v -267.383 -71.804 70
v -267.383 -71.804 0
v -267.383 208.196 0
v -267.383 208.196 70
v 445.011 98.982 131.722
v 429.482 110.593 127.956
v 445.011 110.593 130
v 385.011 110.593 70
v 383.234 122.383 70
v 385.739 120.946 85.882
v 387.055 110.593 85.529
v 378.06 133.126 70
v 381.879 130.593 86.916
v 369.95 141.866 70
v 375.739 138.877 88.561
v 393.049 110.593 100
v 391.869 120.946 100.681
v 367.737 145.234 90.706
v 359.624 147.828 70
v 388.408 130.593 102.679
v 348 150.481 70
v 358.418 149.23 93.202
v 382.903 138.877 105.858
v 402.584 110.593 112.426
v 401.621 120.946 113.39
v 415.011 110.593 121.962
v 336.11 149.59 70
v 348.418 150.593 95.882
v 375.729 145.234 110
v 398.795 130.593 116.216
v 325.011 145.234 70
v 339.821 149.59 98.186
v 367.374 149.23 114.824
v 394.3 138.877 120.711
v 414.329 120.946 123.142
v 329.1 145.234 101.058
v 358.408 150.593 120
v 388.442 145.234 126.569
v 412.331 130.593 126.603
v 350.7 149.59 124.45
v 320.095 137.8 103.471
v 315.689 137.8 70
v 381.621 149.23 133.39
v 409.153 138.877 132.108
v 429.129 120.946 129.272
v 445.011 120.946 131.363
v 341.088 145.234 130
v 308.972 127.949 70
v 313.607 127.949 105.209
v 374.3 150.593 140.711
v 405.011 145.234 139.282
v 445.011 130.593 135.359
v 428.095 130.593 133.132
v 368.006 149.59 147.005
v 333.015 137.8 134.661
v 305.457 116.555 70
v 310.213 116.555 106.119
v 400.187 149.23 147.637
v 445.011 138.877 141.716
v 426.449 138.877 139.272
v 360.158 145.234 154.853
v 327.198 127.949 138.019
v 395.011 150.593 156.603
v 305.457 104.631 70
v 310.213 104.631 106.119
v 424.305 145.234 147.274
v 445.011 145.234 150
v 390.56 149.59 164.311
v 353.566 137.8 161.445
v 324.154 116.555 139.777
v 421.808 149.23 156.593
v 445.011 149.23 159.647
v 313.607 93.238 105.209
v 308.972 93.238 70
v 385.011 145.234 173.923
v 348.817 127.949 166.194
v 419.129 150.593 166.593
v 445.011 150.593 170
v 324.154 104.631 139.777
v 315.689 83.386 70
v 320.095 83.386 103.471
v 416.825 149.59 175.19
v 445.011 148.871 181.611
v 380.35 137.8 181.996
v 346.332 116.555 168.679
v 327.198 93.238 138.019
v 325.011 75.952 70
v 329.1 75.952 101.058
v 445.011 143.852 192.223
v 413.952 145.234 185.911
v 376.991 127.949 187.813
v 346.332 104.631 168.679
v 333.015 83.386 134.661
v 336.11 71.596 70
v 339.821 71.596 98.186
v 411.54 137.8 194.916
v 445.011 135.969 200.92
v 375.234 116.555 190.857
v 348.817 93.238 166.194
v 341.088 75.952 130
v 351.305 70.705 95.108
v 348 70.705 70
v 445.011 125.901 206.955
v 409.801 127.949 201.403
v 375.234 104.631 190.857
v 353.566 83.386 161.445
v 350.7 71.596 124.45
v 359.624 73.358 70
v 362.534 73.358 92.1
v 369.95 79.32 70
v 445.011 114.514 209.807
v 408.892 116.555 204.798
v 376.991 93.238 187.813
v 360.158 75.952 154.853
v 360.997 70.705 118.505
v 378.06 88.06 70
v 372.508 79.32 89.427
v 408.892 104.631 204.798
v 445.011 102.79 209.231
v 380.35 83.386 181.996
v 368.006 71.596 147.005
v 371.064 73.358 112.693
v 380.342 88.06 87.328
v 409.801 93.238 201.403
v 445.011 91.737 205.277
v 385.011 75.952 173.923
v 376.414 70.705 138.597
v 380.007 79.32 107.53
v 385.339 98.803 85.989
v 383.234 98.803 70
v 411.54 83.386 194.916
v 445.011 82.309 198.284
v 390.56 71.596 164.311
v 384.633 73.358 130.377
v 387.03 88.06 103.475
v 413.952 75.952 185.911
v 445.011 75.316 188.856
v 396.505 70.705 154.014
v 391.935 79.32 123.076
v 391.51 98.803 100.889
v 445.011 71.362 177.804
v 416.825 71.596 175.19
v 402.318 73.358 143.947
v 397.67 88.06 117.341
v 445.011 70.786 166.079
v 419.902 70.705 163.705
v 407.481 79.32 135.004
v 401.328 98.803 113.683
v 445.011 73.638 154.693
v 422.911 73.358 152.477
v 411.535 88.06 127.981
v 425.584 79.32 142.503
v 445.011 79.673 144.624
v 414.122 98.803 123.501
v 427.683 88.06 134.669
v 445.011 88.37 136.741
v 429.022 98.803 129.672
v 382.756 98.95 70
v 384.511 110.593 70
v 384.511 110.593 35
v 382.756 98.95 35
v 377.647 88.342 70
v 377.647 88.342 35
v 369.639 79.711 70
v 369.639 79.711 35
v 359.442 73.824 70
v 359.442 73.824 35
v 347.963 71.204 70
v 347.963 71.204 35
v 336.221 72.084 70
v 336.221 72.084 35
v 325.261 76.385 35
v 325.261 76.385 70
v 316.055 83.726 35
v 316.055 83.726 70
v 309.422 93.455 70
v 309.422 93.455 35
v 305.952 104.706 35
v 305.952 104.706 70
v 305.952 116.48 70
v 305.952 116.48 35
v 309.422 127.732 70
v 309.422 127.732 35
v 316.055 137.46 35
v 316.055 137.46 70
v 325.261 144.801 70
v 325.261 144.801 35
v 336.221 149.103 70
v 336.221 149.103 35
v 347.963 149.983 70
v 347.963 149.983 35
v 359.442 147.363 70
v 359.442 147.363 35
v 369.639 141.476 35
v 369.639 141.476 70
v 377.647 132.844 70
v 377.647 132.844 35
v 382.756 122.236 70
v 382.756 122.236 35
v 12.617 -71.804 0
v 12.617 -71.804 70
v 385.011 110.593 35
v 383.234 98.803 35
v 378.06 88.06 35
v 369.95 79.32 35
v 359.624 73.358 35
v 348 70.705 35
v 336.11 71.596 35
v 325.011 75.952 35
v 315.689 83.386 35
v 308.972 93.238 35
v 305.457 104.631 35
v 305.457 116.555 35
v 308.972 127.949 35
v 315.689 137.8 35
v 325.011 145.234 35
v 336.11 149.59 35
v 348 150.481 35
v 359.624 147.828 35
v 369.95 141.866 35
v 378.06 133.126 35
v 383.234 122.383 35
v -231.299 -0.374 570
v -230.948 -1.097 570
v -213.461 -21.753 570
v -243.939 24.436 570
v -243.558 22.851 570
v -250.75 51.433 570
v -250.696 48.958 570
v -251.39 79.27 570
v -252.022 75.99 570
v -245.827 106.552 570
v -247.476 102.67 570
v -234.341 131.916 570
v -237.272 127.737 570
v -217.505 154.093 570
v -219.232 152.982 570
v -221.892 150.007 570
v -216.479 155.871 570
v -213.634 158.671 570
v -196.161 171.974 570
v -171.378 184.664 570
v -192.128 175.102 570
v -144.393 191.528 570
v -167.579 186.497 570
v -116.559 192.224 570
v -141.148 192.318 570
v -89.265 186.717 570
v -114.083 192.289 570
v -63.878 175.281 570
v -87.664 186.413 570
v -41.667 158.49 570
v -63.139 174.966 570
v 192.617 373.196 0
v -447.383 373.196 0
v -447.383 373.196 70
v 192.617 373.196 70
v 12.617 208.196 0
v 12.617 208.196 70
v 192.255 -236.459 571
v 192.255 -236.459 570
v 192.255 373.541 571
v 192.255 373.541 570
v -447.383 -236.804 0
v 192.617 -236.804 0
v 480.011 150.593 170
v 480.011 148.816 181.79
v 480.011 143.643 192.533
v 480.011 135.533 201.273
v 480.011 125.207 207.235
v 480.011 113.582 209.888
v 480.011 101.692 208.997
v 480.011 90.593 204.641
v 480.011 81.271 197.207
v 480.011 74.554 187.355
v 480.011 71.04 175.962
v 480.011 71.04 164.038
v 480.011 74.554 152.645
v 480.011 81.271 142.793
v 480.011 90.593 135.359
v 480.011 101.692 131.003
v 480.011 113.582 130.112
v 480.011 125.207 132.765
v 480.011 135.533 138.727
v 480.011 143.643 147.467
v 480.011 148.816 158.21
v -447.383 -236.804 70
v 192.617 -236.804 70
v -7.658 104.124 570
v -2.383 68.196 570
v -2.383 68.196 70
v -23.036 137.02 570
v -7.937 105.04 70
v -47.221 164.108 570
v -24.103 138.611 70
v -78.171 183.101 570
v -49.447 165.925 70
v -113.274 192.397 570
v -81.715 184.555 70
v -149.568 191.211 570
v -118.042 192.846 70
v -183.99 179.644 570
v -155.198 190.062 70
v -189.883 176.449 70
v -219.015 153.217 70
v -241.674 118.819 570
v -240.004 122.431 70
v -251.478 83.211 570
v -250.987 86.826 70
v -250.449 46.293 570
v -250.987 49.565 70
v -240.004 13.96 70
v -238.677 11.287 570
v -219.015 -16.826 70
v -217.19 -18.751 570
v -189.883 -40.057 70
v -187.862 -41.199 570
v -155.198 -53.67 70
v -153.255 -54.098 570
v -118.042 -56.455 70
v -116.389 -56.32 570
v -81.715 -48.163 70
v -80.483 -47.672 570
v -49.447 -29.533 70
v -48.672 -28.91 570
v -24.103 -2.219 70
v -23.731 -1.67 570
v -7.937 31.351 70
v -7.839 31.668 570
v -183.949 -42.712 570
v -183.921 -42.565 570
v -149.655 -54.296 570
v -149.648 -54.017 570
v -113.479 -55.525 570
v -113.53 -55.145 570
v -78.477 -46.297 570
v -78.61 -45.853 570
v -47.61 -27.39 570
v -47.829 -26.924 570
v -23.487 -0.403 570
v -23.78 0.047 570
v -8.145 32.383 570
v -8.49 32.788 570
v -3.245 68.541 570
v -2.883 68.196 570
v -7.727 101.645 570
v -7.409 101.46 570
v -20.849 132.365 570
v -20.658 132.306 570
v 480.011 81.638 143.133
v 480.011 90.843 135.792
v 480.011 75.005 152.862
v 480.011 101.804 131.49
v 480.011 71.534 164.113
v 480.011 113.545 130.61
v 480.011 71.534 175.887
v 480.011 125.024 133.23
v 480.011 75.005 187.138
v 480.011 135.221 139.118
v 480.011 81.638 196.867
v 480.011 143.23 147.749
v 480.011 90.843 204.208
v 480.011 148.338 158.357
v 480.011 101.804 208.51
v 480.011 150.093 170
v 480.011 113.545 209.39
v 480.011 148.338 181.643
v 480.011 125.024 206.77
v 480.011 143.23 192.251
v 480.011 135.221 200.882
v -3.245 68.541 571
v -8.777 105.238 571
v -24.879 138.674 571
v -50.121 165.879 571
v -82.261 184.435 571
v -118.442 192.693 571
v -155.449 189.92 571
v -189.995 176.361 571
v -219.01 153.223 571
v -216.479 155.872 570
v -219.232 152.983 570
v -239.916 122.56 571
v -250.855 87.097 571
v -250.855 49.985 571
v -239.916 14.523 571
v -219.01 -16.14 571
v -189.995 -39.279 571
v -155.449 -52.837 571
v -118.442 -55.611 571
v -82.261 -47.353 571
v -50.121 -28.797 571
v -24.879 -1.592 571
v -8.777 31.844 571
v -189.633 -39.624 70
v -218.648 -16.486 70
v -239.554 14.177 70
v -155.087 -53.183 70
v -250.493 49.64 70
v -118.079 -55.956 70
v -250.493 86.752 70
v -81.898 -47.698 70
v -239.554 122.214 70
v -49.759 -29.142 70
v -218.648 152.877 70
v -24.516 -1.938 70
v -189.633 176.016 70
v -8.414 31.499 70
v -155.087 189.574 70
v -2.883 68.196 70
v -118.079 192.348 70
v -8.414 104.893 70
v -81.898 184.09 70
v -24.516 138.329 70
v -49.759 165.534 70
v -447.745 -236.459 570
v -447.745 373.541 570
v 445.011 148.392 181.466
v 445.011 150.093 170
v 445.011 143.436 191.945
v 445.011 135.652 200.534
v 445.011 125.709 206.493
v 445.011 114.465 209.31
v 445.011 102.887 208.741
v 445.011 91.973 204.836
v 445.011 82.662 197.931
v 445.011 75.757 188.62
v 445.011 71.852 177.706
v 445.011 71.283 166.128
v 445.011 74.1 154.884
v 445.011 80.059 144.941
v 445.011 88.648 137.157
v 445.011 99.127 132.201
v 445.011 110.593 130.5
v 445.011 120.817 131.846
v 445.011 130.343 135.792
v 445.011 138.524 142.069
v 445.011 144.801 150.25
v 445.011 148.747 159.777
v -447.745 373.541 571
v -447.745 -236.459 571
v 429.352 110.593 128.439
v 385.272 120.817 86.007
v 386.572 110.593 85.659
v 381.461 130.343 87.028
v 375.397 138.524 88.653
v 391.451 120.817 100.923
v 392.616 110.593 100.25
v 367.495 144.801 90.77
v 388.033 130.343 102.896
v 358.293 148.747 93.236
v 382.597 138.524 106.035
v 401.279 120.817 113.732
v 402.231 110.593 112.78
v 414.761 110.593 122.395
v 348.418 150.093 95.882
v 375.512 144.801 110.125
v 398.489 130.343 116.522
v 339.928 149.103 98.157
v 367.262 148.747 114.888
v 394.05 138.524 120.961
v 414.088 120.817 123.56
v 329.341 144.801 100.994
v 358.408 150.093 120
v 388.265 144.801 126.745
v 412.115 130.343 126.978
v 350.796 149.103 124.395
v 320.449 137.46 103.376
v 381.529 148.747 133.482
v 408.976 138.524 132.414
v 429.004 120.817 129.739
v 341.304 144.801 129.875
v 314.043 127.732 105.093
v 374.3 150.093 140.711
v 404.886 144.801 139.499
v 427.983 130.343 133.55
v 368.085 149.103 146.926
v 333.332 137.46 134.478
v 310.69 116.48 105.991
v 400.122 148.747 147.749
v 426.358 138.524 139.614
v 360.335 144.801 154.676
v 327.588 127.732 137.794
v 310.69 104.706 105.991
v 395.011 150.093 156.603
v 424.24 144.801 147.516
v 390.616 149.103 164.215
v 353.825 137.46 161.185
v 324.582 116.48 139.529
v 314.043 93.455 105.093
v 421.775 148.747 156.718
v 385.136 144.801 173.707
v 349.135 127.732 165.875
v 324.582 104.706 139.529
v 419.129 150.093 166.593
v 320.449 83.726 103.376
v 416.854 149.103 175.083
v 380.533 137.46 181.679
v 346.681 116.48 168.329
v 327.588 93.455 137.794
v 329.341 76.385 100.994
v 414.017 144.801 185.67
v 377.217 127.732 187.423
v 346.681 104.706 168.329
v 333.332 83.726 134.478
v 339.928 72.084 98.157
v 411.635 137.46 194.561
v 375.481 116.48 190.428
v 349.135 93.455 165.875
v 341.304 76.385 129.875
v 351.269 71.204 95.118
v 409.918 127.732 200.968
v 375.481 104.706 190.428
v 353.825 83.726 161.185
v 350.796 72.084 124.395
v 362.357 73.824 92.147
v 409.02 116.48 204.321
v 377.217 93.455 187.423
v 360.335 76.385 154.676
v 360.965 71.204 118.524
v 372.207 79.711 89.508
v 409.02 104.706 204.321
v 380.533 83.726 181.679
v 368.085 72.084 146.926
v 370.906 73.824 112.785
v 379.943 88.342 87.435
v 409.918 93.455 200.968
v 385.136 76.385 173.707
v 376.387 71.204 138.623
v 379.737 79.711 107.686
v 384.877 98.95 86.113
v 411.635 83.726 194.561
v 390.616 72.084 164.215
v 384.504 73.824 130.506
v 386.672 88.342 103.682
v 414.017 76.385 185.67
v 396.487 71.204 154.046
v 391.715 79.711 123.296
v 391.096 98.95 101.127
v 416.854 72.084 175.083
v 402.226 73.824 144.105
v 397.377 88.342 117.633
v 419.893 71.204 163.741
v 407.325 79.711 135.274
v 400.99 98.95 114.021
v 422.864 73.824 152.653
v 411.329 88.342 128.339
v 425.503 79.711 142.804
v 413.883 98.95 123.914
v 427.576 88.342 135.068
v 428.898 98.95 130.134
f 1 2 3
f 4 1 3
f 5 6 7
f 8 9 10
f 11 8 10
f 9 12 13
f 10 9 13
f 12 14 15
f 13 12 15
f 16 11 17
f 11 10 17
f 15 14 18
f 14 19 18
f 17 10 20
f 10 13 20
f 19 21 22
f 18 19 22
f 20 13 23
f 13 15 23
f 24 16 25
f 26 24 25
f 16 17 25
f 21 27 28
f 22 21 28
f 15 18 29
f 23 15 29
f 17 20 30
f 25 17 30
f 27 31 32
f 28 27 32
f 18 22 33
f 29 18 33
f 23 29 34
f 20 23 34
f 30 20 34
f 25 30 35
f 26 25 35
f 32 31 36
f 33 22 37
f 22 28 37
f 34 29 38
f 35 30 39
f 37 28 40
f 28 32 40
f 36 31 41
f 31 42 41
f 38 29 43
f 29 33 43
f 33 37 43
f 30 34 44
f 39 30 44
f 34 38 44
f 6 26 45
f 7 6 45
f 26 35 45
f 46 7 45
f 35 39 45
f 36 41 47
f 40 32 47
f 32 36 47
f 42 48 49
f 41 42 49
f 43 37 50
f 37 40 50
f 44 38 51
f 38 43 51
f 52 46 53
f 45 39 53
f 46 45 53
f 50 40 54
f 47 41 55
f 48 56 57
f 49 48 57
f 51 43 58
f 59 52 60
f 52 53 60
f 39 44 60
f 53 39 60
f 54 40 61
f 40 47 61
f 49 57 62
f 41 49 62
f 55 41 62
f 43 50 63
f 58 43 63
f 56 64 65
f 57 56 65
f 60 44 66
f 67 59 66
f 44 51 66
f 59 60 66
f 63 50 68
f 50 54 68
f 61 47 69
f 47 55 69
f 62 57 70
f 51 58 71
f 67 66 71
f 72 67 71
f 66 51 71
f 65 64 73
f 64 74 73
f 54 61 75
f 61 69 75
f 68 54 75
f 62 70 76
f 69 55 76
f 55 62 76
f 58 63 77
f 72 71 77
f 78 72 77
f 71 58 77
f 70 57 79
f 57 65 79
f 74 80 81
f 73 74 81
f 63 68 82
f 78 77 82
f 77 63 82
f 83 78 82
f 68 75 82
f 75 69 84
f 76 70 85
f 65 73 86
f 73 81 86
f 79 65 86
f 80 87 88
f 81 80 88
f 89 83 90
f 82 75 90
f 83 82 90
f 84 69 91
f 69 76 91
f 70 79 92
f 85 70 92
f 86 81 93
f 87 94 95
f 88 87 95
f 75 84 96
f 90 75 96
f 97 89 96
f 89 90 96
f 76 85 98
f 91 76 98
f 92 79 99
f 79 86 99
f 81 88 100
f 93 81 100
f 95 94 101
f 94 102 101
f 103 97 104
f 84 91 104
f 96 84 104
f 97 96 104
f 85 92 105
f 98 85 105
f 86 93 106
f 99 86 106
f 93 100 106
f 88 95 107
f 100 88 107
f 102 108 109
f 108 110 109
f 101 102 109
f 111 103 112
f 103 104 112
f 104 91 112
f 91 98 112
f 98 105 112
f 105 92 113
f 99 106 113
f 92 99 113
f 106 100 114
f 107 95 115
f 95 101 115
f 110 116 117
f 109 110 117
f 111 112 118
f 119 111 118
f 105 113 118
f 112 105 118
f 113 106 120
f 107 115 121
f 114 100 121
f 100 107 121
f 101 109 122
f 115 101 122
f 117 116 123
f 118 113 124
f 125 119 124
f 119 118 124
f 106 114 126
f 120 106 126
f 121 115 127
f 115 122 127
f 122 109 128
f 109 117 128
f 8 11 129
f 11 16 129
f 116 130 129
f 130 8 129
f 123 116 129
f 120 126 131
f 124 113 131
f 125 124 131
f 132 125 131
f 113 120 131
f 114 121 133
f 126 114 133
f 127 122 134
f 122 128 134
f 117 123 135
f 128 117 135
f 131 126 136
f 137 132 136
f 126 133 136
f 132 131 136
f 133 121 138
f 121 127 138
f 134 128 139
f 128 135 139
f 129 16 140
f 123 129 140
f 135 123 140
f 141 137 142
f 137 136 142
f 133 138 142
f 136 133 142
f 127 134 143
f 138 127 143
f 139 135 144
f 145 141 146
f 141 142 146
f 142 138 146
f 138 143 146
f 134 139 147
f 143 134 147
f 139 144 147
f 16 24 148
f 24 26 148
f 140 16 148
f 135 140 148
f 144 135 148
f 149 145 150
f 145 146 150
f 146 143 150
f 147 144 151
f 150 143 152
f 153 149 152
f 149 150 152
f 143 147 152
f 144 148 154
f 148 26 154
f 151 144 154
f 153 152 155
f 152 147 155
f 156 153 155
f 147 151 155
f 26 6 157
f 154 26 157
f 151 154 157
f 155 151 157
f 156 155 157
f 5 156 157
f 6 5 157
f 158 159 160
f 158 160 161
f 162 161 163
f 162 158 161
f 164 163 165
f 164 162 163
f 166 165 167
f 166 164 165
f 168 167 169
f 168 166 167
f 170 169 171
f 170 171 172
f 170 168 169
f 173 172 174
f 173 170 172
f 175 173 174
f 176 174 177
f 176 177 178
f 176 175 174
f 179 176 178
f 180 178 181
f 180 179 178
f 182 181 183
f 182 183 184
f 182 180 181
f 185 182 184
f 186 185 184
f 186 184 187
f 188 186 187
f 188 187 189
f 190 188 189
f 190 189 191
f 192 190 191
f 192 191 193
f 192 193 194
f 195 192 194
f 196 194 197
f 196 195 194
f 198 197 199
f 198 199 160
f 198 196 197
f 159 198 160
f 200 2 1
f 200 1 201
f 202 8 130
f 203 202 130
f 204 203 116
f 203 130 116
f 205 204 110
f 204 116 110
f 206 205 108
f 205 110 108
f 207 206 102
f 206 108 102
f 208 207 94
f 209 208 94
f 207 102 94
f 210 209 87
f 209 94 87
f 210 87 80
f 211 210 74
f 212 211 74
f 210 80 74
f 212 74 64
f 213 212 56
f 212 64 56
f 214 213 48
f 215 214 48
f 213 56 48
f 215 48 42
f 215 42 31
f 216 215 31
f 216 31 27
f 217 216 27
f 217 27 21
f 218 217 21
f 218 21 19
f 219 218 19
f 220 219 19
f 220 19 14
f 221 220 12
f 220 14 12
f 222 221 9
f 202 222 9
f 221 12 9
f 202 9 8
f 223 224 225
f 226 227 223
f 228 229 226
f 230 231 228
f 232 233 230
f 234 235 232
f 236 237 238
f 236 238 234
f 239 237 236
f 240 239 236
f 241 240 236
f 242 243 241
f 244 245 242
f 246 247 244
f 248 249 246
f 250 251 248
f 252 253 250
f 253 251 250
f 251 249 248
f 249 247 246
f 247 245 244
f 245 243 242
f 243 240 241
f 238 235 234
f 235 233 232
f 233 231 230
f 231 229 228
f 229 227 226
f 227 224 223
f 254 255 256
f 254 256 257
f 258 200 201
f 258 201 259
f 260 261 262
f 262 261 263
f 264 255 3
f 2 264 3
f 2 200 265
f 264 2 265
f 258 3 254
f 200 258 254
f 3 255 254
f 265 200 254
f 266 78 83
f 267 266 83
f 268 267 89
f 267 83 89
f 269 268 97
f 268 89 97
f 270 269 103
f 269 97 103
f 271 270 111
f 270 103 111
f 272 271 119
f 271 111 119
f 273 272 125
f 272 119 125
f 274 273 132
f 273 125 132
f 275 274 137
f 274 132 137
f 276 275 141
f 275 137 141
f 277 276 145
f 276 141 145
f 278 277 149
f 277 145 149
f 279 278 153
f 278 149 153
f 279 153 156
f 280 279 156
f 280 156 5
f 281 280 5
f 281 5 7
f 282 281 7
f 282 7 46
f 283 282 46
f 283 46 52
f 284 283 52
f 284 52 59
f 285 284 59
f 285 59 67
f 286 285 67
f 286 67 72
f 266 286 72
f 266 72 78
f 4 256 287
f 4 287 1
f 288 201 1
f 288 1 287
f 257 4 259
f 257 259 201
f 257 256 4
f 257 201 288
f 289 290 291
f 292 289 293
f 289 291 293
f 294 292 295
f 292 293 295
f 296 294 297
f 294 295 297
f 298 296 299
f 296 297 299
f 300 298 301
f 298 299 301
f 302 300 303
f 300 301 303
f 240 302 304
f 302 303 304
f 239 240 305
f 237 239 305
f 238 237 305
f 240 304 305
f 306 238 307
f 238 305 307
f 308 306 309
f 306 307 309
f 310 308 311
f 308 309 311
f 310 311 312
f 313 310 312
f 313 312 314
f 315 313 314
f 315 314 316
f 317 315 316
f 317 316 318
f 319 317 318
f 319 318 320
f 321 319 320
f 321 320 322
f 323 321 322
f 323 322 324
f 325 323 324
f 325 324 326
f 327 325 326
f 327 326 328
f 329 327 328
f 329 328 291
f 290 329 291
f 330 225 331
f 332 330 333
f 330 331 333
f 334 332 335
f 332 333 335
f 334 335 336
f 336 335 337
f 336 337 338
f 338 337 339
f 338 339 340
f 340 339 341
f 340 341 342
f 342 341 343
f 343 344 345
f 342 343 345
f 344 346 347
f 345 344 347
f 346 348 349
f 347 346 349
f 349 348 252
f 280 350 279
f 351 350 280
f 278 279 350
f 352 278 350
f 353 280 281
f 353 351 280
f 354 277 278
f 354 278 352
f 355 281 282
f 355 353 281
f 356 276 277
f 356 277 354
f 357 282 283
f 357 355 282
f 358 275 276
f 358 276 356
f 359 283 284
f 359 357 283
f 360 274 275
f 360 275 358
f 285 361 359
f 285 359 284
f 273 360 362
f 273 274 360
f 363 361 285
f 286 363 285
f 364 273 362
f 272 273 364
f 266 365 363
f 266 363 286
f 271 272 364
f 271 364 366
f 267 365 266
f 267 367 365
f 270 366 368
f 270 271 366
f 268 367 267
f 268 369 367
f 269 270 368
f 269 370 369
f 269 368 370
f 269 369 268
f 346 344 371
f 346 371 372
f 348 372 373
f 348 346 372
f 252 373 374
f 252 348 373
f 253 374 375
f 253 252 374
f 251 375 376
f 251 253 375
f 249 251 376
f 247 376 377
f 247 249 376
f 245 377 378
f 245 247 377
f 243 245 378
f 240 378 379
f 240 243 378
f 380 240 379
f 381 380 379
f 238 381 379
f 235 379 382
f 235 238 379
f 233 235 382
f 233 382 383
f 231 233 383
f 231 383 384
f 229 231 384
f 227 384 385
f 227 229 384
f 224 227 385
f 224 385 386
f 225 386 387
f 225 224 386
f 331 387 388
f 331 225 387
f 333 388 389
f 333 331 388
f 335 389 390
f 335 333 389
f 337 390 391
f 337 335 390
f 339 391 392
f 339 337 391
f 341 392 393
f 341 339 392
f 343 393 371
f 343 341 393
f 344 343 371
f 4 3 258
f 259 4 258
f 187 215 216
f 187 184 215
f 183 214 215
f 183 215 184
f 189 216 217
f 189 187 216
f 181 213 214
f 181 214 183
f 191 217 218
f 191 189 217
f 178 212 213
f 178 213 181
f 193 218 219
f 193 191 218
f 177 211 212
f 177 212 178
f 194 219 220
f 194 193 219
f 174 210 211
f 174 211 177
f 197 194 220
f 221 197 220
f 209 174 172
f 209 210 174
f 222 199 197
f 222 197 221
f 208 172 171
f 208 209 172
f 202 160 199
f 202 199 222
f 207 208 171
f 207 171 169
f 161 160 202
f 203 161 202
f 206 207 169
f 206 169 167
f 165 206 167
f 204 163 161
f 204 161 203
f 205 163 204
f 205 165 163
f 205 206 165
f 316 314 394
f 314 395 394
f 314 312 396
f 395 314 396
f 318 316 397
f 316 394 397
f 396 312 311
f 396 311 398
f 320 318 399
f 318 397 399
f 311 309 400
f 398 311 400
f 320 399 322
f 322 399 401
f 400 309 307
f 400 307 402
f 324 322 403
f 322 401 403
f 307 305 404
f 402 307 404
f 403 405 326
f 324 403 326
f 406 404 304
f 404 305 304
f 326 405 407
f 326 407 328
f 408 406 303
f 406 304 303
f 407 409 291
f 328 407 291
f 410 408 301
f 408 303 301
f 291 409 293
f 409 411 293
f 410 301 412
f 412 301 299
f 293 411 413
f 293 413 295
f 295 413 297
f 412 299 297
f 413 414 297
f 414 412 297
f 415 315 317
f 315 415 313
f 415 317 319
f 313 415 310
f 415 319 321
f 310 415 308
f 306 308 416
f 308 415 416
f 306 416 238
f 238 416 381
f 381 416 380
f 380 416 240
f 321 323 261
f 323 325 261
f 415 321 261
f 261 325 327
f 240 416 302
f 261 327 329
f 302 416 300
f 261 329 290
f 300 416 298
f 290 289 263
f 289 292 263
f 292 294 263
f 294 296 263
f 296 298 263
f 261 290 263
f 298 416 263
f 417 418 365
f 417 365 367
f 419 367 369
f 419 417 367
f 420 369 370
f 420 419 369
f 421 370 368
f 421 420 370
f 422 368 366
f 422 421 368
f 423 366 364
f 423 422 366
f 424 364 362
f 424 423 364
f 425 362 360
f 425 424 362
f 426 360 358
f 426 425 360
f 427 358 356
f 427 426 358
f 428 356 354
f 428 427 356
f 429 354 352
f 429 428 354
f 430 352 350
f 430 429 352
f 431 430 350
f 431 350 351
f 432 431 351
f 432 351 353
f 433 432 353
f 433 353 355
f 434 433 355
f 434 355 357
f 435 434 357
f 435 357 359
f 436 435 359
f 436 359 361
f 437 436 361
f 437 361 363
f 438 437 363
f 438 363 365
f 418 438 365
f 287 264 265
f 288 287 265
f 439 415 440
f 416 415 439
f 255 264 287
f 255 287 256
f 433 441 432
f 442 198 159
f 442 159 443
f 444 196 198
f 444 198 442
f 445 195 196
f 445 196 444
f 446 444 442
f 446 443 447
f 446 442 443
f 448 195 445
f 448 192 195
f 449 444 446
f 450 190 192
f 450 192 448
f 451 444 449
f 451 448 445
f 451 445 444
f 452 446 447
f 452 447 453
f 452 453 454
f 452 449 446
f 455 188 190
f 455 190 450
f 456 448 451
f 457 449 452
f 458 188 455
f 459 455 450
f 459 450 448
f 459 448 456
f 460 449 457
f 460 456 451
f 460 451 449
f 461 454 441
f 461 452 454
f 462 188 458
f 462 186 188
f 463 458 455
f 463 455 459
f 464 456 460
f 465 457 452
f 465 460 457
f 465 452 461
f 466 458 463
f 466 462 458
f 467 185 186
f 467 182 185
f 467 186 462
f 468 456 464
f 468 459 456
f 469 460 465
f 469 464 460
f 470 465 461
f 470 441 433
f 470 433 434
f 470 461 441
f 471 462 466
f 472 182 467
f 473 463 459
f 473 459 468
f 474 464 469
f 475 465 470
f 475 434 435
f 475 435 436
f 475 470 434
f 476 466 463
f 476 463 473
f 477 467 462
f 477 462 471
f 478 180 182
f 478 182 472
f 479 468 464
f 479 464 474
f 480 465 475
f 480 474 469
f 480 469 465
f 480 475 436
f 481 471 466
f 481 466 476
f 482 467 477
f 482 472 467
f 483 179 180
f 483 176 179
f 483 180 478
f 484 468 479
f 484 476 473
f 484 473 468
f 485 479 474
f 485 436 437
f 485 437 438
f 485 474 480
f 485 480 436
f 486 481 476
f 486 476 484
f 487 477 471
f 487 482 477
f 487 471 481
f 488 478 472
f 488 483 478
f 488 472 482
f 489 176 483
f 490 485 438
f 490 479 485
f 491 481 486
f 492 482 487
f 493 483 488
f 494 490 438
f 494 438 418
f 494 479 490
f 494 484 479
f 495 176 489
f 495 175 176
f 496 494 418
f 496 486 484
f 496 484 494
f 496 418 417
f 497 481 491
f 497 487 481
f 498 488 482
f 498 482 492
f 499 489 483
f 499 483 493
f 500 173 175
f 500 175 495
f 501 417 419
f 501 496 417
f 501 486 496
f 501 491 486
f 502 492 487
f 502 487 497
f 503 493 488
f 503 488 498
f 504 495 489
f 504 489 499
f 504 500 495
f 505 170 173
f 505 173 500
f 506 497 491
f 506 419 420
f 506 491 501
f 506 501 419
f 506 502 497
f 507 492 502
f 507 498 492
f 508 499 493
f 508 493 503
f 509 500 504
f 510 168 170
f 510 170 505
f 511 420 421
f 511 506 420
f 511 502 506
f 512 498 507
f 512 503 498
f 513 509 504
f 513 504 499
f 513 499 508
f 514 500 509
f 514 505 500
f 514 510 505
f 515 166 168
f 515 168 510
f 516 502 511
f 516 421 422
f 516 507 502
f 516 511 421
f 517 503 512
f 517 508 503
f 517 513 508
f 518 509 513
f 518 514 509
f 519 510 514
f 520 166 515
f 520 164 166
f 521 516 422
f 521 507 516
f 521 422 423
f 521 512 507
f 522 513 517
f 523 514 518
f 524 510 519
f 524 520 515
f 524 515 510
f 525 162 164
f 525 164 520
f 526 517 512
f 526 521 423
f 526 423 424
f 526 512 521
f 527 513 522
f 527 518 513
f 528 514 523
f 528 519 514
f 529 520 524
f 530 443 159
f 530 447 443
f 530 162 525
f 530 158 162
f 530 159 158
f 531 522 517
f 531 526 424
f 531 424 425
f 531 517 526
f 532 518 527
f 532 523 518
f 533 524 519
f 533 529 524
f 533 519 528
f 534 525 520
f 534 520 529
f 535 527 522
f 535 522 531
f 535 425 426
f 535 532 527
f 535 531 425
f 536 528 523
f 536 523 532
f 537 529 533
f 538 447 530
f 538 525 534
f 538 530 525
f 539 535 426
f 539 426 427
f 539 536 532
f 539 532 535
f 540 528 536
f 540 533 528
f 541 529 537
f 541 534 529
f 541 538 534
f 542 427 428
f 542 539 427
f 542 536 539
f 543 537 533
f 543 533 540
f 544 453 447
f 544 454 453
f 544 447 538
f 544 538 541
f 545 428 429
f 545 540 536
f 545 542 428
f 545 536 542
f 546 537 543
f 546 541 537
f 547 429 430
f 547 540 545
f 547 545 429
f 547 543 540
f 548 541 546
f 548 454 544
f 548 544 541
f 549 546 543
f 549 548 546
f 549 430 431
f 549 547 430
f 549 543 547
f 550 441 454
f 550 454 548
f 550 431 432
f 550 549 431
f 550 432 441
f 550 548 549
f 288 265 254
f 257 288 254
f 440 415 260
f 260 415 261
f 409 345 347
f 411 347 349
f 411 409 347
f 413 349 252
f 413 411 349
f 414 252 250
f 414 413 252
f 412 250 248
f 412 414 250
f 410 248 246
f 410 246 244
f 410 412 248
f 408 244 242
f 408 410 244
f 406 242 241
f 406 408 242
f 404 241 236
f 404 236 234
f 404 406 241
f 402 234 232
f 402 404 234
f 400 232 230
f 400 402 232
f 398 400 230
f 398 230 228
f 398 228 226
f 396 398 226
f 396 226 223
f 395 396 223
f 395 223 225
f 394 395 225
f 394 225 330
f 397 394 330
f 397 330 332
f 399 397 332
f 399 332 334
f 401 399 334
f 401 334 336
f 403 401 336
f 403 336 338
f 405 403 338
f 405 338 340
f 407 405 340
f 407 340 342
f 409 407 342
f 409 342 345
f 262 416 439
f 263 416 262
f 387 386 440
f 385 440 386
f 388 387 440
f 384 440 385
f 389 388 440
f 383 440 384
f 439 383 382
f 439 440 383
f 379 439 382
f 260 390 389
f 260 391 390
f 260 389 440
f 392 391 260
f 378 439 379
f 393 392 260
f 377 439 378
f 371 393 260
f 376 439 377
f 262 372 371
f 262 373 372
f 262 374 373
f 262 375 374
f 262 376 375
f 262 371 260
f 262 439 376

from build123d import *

# Parameters (mm, degrees)
F0_W      = 640
F0_H      = 610
F0_W_2    = 280
F0_H_2    = 280
F1_DEPTH  = 70
F2_R      = 125
F2_R_2    = 124.5
F3_DEPTH  = 500
F4_R      = 40
F4_R_2    = 39.5
F5_ANGLE  = -90
F6_R      = 40
F6_R_2    = 39.5
F7_DEPTH  = 35
F8_R      = 40
F8_R_2    = 39.5
F9_DEPTH  = 35
F10_W     = 640
F10_H     = 610
F10_R     = 124.5
F11_DEPTH = 1


with BuildPart() as f1:
    # F0 (on Top) → F1 (new body)
    with BuildSketch(Plane.XY):
        with Locations((-127.38312, 68.195768)):
            Rectangle(F0_W, F0_H)
        with Locations((-127.38312, 68.195768)):
            Rectangle(F0_W_2, F0_H_2, mode=Mode.SUBTRACT)
    extrude(amount=F1_DEPTH)


with BuildPart() as f3:
    # F2 (on face) → F3 (new body)
    with BuildSketch(Plane.XY.offset(70)):
        with Locations((-127.38312, 68.195768)):
            Circle(F2_R)
        with Locations((-127.38312, 68.195768)):
            Circle(F2_R_2, mode=Mode.SUBTRACT)
    extrude(amount=F3_DEPTH)

    # F10 (on face) → F11 (join)
    with BuildSketch(Plane.XY.offset(570)):
        with Locations((-127.745472, 68.541134)):
            Rectangle(F10_W, F10_H)
        with Locations((-127.745472, 68.541134)):
            Circle(F10_R, mode=Mode.SUBTRACT)
    extrude(amount=F11_DEPTH)


with BuildPart() as f5:
    # F4 (on face) → F5 (revolve)
    with BuildSketch(Plane.XY.offset(70)):
        with Locations((345.010722, 110.593185)):
            Circle(F4_R)
        with Locations((345.010722, 110.593185)):
            Circle(F4_R_2, mode=Mode.SUBTRACT)
    revolve(axis=Axis((445.010722, 110.443847, 70), (0, -1, 0)), revolution_arc=F5_ANGLE)

    # F6 (on face) → F7 (join)
    with BuildSketch(Plane.YZ.offset(445.010722)):
        with Locations((110.593185, 170)):
            Circle(F6_R)
        with Locations((110.593185, 170)):
            Circle(F6_R_2, mode=Mode.SUBTRACT)
    extrude(amount=F7_DEPTH)

    # F8 (on face) → F9 (join)
    with BuildSketch(Plane(origin=(0, 0, 70), x_dir=(1, 0, 0), z_dir=(0, 0, -1))):
        with Locations((345.010722, -110.593185)):
            Circle(F8_R)
        with Locations((345.010722, -110.593185)):
            Circle(F8_R_2, mode=Mode.SUBTRACT)
    extrude(amount=F9_DEPTH)


solid = Compound([f1.part, f3.part, f5.part])
